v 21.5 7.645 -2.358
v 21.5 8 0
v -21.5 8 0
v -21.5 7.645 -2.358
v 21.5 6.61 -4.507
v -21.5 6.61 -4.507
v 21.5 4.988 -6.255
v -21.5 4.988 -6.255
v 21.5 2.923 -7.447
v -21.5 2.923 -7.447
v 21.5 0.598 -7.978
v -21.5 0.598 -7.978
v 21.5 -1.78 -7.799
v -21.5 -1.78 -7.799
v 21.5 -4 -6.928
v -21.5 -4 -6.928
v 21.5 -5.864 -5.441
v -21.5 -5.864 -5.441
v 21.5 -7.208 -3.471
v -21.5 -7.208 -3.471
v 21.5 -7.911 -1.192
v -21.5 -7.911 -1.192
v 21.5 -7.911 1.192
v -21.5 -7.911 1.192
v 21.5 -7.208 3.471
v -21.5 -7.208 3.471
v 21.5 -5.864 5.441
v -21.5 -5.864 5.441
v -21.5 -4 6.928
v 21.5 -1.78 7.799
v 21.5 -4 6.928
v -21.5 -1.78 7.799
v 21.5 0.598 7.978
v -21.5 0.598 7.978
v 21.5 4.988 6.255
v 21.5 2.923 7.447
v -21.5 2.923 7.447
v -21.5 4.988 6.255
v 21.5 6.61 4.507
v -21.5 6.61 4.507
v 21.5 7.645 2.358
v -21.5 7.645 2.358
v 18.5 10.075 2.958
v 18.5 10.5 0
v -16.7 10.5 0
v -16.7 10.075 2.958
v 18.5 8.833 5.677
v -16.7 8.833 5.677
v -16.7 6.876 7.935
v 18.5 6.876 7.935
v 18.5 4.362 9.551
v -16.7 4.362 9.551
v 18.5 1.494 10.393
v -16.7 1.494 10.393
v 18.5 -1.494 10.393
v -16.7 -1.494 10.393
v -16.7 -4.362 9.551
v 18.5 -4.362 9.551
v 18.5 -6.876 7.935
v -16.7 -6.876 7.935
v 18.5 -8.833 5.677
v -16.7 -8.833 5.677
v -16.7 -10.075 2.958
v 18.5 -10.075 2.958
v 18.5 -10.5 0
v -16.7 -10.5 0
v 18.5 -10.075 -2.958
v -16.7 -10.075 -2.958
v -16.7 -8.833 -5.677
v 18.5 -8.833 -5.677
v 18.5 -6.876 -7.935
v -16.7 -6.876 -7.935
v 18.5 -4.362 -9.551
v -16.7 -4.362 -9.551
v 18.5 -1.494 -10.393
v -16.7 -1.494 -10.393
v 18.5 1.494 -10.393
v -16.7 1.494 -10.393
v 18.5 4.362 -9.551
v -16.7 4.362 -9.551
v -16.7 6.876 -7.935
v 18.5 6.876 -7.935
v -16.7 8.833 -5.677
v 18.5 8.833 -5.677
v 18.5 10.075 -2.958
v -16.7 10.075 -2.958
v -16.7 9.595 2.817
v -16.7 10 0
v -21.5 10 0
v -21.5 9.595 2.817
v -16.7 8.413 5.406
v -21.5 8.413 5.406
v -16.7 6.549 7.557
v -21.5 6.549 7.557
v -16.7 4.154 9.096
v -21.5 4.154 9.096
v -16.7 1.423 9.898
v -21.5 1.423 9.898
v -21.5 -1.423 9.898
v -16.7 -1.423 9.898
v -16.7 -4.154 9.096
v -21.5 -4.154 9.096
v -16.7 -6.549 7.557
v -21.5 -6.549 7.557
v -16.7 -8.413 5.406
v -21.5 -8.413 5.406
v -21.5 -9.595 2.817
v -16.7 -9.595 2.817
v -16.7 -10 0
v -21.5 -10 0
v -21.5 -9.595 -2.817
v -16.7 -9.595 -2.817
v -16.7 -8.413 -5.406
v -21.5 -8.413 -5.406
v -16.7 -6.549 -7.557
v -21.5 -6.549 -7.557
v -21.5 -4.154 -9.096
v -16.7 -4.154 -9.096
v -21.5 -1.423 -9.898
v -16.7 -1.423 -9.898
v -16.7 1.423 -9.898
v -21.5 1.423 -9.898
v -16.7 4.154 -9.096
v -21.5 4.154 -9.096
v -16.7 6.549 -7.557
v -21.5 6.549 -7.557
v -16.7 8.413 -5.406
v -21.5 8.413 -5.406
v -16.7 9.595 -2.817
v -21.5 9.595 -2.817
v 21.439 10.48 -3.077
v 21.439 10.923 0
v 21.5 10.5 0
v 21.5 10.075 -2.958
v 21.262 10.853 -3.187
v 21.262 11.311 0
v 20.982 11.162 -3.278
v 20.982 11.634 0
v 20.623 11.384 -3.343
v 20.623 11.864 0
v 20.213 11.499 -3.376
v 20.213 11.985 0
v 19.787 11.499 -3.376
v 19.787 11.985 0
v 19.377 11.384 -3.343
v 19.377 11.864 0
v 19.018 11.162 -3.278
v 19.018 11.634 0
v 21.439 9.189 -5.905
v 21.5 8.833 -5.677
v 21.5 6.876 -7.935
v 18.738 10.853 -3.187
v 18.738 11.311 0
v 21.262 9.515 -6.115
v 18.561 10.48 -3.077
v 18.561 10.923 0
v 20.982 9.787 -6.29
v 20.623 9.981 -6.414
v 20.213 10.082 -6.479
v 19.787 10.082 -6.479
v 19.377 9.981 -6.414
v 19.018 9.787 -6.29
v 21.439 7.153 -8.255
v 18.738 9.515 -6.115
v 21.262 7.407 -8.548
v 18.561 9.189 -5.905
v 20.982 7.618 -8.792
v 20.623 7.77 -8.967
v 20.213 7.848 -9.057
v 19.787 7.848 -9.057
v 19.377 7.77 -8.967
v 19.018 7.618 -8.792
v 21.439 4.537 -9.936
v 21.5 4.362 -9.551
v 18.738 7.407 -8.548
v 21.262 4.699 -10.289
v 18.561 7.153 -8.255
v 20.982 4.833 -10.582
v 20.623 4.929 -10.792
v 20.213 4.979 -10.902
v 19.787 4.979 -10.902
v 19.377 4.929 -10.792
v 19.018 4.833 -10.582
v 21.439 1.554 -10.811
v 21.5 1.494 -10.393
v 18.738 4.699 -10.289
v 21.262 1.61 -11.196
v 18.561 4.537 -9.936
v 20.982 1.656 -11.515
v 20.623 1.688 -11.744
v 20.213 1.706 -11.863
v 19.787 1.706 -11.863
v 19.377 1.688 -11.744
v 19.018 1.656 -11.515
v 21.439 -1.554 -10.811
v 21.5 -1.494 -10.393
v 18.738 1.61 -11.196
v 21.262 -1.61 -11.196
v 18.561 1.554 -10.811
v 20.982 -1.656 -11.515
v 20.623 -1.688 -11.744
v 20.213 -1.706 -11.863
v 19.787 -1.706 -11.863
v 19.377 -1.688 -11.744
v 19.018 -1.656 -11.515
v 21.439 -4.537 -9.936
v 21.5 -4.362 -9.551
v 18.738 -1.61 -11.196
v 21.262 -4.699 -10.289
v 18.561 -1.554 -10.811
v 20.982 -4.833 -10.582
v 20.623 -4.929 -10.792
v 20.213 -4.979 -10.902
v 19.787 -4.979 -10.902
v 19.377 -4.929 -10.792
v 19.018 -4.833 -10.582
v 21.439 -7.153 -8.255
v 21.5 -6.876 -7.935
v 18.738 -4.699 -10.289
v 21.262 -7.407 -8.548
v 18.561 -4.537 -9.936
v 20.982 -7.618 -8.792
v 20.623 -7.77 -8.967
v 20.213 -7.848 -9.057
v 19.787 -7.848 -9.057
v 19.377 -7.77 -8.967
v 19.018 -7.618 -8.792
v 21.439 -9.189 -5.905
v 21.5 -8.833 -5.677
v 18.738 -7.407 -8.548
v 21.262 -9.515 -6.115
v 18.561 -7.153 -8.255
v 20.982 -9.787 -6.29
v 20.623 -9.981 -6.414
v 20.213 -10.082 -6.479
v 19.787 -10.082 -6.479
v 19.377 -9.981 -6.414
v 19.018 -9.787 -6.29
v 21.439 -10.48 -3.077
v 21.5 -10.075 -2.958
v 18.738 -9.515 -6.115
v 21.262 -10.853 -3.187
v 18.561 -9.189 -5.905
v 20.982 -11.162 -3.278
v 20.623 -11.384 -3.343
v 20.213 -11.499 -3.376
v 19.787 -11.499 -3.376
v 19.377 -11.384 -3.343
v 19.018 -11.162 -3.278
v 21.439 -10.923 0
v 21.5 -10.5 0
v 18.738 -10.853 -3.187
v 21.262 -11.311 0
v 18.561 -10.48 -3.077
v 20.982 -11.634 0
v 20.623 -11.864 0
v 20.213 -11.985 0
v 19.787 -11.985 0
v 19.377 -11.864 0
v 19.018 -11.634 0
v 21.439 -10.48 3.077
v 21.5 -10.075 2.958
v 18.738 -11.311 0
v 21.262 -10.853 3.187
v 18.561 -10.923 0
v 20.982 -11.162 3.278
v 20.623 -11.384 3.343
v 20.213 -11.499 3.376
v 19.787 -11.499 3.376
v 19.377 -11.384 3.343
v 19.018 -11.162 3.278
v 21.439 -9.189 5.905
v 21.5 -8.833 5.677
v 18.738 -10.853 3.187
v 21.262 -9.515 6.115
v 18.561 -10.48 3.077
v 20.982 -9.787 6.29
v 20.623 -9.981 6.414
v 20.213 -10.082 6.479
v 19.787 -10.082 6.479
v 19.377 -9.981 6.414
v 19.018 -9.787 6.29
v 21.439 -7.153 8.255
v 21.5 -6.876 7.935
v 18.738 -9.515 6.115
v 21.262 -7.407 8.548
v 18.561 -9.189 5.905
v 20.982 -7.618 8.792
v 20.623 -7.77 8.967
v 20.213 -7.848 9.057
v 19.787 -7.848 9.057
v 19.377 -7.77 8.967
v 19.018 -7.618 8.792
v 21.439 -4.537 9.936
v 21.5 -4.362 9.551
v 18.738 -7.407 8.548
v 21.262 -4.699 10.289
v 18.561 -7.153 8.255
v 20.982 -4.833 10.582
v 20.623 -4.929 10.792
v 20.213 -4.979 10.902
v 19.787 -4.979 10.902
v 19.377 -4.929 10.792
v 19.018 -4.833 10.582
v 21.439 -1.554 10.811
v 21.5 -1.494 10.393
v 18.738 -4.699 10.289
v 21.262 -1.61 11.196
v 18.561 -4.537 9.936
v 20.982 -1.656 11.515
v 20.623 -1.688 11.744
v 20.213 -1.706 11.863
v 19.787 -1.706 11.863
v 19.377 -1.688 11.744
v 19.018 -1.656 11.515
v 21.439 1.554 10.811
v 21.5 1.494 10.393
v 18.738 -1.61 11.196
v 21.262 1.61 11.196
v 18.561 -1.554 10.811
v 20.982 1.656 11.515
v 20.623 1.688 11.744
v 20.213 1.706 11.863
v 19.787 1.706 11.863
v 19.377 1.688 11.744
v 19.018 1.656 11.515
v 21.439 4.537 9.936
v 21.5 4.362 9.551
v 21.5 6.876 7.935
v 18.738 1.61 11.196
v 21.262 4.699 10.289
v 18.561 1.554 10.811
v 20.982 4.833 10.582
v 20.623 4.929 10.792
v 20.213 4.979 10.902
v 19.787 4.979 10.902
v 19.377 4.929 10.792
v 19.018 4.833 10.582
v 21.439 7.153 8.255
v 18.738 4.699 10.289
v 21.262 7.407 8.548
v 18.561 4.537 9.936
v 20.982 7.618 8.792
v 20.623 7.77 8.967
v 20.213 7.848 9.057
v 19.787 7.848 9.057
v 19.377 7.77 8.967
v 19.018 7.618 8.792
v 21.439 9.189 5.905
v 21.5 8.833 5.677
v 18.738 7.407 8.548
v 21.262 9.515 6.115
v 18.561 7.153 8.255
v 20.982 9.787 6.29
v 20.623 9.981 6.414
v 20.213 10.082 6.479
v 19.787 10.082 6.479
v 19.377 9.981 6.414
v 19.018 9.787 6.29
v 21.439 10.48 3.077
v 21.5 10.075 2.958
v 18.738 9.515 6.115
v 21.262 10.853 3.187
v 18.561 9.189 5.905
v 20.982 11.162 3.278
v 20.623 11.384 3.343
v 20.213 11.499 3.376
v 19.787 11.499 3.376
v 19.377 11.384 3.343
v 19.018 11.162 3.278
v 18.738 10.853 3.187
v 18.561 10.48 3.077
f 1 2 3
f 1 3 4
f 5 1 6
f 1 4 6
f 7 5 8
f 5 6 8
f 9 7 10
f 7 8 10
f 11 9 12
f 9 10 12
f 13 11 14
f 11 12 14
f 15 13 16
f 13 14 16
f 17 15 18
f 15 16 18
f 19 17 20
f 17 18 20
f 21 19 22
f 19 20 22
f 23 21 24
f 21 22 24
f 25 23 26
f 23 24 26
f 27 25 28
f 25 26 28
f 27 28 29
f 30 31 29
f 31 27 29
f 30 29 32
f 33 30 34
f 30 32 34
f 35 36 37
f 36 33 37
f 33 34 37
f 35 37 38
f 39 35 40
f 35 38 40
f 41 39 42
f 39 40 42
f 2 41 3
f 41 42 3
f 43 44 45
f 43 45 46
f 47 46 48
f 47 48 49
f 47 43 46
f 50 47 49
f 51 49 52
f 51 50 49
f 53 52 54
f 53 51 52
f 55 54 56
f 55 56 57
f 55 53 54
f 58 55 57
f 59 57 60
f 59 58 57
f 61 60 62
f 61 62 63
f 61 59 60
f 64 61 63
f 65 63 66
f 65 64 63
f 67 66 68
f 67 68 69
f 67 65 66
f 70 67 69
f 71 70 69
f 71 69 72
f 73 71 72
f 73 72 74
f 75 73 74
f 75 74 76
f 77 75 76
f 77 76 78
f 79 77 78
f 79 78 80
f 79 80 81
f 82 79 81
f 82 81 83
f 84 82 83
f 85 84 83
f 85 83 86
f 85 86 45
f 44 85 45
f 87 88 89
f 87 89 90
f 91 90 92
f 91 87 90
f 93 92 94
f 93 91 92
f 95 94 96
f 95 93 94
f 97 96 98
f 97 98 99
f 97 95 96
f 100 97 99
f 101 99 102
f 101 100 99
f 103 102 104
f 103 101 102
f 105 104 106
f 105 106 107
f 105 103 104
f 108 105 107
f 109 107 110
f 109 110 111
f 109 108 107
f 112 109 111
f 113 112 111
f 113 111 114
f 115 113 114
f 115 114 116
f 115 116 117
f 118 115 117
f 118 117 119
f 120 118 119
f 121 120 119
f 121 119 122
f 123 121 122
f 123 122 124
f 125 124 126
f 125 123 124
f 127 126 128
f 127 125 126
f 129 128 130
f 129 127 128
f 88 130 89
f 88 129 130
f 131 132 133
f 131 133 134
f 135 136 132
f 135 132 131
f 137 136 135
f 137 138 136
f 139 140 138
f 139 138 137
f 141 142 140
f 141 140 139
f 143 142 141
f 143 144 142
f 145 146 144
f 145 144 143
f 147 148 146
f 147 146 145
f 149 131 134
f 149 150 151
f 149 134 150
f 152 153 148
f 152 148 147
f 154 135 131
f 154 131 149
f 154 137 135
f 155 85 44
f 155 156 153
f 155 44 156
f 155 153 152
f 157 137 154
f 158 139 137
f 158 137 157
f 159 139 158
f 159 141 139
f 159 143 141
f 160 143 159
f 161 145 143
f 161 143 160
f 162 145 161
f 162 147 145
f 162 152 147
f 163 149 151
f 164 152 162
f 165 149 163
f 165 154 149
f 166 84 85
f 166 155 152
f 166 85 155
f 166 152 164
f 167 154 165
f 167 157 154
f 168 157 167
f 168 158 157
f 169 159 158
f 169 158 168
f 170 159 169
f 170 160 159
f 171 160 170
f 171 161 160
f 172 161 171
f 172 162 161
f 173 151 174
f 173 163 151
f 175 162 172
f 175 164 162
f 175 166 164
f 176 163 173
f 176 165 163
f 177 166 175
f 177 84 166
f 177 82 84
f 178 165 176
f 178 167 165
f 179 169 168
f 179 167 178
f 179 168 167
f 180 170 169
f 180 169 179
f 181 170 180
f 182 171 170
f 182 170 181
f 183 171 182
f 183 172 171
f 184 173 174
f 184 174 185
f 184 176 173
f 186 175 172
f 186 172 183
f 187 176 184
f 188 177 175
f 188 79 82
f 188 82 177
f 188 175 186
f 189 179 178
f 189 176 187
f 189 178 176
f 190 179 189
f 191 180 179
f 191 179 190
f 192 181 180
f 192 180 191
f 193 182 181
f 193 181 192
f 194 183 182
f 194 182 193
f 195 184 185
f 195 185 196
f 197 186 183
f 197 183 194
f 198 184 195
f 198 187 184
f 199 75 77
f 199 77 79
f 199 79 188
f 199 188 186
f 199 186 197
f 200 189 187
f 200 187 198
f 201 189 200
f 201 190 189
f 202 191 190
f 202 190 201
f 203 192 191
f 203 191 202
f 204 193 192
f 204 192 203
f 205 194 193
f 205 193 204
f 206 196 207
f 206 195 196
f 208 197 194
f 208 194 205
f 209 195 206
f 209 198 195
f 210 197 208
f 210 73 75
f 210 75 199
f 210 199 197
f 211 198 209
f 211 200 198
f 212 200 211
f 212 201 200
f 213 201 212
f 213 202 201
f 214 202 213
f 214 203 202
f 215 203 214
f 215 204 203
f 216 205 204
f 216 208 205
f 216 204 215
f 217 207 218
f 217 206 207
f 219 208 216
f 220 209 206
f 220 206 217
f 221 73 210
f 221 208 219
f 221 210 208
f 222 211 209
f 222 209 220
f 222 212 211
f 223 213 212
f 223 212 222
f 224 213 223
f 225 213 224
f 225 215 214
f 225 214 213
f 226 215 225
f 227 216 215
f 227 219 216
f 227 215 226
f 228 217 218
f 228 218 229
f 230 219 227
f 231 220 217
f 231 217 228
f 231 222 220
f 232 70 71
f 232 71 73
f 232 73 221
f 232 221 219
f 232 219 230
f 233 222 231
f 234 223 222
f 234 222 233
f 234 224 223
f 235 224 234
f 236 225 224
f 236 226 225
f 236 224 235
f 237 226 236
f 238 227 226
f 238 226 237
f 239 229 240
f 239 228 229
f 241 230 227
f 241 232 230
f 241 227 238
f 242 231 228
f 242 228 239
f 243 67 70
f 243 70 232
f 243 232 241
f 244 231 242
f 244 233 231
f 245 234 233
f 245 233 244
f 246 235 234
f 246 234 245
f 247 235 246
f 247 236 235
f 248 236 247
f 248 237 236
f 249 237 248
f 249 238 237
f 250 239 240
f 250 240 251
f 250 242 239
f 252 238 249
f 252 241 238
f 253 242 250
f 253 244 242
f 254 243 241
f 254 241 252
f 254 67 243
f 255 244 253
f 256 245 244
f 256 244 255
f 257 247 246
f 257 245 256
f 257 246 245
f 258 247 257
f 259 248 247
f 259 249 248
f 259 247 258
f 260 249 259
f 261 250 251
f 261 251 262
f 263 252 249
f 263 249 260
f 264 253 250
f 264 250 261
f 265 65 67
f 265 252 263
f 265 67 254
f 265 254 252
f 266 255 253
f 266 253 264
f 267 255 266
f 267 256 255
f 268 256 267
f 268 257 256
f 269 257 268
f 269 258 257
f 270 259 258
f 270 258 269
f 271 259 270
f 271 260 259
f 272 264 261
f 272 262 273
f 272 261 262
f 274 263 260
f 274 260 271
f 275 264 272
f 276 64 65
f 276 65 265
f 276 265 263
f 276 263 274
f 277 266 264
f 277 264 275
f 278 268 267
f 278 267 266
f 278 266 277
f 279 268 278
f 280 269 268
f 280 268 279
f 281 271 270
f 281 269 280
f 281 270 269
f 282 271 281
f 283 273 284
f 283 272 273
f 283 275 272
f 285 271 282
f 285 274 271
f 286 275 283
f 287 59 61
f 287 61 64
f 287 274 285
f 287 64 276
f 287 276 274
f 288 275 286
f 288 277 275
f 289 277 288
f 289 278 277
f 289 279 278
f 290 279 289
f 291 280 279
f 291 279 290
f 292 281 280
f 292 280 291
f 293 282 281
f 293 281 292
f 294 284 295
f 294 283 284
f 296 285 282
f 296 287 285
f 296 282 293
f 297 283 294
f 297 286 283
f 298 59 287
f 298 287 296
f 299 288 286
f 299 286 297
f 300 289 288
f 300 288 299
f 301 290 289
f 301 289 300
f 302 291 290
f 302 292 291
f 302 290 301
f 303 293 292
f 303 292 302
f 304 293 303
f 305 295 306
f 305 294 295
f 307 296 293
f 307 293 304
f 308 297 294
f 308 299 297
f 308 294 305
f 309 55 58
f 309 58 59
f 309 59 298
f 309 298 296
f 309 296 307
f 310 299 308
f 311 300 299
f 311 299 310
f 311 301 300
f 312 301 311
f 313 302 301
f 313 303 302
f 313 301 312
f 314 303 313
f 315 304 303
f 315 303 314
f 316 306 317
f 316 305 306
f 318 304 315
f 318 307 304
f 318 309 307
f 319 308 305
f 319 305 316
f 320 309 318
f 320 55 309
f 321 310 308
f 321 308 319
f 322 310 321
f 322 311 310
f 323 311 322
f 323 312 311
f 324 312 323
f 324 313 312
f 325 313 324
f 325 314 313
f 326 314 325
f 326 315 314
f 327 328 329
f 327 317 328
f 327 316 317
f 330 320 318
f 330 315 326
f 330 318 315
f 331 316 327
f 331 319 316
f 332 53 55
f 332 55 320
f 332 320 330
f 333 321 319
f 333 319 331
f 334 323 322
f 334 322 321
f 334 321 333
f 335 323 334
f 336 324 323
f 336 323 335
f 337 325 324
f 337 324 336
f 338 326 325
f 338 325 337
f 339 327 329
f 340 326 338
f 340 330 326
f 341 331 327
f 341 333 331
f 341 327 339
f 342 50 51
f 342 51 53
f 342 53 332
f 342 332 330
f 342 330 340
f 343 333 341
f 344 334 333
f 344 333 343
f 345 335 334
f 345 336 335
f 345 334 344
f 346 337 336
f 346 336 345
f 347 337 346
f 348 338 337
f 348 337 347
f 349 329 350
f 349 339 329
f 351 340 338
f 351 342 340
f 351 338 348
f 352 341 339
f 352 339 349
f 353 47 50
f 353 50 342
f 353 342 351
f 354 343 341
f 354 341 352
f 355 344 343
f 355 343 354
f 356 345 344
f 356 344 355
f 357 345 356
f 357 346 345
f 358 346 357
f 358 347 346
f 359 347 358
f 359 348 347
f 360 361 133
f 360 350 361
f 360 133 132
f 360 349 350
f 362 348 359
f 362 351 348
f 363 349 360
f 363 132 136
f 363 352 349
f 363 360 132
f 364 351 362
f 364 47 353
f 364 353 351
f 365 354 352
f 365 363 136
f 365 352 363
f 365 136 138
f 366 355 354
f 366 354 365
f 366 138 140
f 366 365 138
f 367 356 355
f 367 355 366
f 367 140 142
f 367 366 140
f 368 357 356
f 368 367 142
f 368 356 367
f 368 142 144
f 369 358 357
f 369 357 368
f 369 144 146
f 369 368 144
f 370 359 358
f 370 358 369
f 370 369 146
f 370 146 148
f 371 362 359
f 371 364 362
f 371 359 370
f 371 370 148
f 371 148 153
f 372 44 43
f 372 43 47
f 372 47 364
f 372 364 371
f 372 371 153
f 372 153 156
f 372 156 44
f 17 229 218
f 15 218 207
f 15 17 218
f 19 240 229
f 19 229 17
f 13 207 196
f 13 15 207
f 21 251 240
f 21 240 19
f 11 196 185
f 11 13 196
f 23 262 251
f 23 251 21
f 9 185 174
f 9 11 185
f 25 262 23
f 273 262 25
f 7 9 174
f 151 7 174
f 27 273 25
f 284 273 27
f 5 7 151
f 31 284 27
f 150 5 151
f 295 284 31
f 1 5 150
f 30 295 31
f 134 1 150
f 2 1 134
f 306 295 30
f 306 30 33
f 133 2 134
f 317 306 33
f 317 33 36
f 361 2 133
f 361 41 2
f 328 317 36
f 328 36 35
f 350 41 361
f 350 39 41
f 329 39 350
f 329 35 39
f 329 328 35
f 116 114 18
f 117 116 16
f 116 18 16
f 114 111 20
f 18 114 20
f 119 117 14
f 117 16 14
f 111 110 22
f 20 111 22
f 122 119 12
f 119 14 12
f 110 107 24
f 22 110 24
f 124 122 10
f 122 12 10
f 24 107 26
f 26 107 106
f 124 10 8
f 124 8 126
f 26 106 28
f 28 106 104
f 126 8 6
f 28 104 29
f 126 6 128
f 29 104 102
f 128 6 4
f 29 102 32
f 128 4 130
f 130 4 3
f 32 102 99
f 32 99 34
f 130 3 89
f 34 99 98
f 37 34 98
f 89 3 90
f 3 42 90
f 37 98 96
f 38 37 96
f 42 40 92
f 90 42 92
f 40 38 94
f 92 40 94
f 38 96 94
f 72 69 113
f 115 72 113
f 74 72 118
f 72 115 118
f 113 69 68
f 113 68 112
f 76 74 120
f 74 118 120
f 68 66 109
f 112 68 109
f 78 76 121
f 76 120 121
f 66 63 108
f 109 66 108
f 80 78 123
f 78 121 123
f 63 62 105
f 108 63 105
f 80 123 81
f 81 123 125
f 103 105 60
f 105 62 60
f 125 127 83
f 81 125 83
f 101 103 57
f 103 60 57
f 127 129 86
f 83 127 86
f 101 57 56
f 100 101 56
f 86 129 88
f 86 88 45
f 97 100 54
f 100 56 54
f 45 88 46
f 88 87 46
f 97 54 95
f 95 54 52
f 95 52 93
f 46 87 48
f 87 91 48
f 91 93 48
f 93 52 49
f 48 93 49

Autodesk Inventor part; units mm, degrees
ref_plane "YZ Plane" through (0, 0, 0) normal (1, 0, 0) x (0, 1, 0)
ref_plane "XZ Plane" through (0, 0, 0) normal (0, 1, 0) x (-1, 0, 0)
ref_plane "XY Plane" through (0, 0, 0) normal (0, 0, 1) x (1, 0, 0)
sketch "Skizze1" plane through (0, 0, 0) normal (0, 0, 1) x (1, 0, 0)
  line L0 (0, -2.4) -> (0, 14.4) projected
  line L1 (-30.1, 0) -> (30.1, 0) projected
  arc A0 (21.5, 10.5) -> (18.5, 10.5) centre (20, 10.5) ccw
  line L2 (21.5, 10.5) -> (21.5, 8)
  line L3 (21.5, 8) -> (-21.5, 8)
  line L4 (-21.5, 8) -> (-21.5, 10)
  line L5 (-21.5, 10) -> (-16.7, 10)
  line L6 (-16.7, 10) -> (-16.7, 10.5)
  line L7 (-16.7, 10.5) -> (18.5, 10.5)
  point P0 (0, 0)
  dimension "d0" = 3
  dimension "d1" = 21
  dimension "d2" = 16
  dimension "d3" = 43
  dimension "d4" = 4.8
  dimension "d5" = 20
revolve "Umdrehung1" add sketch "Skizze1" angle 360 about axis through (-10, 0, 0) along (1, 0, 0)
properties part number "Zylinder"
